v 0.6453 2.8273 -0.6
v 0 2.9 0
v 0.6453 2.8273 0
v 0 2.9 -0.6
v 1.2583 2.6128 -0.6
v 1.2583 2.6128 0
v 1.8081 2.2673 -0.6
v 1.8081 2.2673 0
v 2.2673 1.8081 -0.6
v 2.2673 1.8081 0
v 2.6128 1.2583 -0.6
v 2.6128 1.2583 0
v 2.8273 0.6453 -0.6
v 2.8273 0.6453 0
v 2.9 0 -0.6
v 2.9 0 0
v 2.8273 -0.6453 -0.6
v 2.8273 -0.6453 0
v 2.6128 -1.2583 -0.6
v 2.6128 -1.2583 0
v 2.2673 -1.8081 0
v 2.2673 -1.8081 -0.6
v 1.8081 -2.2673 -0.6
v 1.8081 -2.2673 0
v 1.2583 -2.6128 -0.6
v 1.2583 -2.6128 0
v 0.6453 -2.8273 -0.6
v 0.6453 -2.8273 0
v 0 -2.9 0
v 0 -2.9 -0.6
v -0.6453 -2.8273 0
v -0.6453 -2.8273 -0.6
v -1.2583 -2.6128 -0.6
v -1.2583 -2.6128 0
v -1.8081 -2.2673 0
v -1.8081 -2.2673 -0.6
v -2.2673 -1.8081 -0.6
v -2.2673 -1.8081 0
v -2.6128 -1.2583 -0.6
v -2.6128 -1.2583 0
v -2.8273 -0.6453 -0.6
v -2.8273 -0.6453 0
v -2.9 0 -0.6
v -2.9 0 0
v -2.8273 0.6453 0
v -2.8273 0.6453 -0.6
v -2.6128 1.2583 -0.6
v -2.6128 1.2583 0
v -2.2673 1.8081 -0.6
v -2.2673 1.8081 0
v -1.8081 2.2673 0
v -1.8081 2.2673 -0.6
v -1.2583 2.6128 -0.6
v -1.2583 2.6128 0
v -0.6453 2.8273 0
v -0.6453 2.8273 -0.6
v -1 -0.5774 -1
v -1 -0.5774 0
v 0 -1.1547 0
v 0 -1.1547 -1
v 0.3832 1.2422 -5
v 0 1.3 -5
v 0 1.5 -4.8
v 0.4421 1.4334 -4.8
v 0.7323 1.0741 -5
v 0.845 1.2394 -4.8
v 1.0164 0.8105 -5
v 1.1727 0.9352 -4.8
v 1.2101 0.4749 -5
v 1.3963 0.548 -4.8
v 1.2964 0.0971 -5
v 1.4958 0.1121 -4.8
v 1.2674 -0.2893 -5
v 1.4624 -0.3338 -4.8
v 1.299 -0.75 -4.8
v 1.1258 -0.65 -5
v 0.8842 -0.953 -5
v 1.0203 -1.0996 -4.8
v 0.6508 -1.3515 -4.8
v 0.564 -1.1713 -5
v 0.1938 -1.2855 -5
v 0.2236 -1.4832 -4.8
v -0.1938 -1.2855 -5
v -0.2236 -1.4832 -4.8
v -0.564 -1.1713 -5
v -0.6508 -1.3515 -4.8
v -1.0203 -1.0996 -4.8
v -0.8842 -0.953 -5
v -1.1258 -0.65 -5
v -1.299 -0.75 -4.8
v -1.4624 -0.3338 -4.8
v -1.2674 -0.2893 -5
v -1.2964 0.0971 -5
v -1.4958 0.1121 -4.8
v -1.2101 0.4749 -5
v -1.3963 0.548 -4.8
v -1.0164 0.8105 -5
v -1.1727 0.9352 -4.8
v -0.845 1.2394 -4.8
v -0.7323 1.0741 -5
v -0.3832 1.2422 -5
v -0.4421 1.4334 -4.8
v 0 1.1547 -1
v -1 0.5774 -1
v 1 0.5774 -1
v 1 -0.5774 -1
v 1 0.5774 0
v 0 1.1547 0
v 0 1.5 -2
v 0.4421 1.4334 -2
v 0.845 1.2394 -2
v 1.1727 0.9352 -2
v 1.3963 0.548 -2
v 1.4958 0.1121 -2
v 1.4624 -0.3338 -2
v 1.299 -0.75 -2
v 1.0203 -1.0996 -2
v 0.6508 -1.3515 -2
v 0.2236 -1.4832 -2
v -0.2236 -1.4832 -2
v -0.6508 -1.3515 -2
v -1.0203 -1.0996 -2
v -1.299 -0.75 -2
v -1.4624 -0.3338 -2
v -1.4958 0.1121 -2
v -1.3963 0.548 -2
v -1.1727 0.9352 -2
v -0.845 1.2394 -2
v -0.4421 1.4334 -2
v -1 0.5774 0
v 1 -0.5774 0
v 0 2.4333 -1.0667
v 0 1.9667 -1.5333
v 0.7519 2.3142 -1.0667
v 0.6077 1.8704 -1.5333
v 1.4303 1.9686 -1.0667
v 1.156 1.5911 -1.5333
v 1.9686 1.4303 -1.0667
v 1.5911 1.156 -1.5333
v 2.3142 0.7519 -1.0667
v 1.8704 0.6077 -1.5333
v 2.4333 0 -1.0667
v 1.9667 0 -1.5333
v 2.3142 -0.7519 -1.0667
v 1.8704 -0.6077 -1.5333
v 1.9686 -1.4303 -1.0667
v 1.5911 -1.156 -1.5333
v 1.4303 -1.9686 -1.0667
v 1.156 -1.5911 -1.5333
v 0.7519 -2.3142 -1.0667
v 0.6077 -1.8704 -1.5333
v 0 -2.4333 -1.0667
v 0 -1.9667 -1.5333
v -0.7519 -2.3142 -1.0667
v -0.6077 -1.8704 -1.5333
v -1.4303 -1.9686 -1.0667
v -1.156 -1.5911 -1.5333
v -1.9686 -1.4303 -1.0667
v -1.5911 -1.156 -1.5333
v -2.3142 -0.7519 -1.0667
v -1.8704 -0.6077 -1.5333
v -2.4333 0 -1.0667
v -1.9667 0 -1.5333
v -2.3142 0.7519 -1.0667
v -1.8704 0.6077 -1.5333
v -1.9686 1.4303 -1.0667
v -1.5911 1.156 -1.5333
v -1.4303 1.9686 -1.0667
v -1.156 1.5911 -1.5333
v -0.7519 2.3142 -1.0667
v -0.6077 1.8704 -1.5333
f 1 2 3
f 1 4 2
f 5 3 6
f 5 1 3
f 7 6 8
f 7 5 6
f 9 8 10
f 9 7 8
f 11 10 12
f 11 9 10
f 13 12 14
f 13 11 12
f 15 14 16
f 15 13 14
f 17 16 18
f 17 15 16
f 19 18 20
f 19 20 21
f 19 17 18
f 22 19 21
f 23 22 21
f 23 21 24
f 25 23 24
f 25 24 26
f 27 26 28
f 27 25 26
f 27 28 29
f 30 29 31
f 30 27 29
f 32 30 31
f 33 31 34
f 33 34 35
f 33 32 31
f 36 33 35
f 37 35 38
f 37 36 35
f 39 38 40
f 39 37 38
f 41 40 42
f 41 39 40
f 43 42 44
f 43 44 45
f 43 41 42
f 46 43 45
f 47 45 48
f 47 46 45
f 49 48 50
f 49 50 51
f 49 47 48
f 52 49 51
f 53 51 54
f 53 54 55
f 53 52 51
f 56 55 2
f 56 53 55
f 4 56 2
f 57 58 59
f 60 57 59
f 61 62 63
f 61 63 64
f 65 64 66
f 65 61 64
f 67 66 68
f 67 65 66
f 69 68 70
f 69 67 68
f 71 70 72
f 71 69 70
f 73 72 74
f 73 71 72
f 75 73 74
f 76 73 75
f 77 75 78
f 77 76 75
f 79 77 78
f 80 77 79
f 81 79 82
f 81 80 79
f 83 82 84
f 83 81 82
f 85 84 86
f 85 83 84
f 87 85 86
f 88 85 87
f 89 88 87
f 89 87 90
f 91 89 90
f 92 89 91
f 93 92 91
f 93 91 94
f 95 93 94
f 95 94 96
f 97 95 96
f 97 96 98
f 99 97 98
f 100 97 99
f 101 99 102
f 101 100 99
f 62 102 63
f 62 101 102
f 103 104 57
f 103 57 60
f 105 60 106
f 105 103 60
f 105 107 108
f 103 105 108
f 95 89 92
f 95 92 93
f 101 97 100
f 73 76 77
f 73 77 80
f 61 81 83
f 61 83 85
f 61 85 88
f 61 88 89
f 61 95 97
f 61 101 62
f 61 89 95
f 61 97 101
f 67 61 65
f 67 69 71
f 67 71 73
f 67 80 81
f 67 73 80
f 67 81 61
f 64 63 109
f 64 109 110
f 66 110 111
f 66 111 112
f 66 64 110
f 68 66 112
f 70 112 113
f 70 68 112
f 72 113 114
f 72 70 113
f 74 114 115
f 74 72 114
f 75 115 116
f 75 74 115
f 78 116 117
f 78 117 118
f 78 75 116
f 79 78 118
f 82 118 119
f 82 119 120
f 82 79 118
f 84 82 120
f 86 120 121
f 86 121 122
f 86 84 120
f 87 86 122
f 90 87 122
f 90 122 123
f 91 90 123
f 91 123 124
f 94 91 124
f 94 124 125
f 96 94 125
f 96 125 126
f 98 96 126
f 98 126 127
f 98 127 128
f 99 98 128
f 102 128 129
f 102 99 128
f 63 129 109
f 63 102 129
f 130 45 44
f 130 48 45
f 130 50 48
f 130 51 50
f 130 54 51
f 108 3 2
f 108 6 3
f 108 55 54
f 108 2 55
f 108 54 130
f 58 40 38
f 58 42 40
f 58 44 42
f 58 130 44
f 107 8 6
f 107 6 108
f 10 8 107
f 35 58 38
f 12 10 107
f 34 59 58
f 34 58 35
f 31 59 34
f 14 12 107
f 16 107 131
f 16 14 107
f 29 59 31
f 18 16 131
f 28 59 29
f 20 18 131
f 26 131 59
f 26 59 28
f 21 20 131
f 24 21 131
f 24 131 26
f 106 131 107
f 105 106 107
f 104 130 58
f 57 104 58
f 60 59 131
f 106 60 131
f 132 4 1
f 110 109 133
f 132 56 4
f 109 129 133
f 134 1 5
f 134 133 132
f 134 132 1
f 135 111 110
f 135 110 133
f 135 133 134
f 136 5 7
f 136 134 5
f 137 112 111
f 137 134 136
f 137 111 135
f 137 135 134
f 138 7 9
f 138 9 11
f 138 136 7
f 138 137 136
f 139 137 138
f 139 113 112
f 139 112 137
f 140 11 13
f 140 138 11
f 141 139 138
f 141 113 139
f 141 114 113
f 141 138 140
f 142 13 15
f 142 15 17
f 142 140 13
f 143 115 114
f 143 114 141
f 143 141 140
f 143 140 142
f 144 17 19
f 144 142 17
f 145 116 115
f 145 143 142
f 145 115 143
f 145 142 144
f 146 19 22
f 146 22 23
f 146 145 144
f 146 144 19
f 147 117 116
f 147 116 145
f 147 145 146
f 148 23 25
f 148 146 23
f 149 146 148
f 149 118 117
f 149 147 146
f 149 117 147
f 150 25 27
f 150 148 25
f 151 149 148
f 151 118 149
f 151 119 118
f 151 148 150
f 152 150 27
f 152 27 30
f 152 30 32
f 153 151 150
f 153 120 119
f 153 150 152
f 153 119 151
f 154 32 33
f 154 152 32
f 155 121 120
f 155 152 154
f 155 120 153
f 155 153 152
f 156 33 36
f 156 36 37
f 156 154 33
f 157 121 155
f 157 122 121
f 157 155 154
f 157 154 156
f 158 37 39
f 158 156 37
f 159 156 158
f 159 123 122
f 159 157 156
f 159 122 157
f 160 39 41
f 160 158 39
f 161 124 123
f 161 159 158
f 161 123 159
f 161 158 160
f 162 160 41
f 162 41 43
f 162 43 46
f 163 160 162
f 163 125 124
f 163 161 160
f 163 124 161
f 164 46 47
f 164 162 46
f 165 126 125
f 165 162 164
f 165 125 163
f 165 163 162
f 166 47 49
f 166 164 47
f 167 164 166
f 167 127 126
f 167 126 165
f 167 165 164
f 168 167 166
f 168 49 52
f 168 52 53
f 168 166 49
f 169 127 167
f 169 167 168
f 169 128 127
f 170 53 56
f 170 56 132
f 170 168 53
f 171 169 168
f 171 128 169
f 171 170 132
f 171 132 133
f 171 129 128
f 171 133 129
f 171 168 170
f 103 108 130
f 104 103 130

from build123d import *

# Parameters (mm, degrees)
SCHNITT_LINEAR_AUSTRAGEN1_DEPTH = 1
FASE1_SIZE                      = 0.2


with BuildPart() as part:
    # Skizze1 → Rotation1 (revolve)
    with BuildSketch(Plane(origin=(0, 0, 0), x_dir=(0, 0, -1), z_dir=(1, 0, 0))):
        Polygon((0, 0), (0, 2.9), (0.6, 2.9), (2, 1.5), (5, 1.5), (5, 0), align=None)
    revolve(axis=Axis((0, 0, 31.763581507), (0, 0, -1)))

    # Skizze3 → Schnitt-Linear austragen1 (cut)
    with BuildSketch(Plane.XY):
        Polygon((1, -0.577350269), (1, 0.577350269), (0, 1.154700538), (-1, 0.577350269), (-1, -0.577350269), (0, -1.154700538), align=None)
    extrude(amount=-SCHNITT_LINEAR_AUSTRAGEN1_DEPTH, mode=Mode.SUBTRACT)

    # Fase1
    fase1_edges = [part.edges().sort_by_distance(p)[0] for p in [
        (0, -1.5, -5),
    ]]
    chamfer(fase1_edges, length=FASE1_SIZE)


solid = part.part
